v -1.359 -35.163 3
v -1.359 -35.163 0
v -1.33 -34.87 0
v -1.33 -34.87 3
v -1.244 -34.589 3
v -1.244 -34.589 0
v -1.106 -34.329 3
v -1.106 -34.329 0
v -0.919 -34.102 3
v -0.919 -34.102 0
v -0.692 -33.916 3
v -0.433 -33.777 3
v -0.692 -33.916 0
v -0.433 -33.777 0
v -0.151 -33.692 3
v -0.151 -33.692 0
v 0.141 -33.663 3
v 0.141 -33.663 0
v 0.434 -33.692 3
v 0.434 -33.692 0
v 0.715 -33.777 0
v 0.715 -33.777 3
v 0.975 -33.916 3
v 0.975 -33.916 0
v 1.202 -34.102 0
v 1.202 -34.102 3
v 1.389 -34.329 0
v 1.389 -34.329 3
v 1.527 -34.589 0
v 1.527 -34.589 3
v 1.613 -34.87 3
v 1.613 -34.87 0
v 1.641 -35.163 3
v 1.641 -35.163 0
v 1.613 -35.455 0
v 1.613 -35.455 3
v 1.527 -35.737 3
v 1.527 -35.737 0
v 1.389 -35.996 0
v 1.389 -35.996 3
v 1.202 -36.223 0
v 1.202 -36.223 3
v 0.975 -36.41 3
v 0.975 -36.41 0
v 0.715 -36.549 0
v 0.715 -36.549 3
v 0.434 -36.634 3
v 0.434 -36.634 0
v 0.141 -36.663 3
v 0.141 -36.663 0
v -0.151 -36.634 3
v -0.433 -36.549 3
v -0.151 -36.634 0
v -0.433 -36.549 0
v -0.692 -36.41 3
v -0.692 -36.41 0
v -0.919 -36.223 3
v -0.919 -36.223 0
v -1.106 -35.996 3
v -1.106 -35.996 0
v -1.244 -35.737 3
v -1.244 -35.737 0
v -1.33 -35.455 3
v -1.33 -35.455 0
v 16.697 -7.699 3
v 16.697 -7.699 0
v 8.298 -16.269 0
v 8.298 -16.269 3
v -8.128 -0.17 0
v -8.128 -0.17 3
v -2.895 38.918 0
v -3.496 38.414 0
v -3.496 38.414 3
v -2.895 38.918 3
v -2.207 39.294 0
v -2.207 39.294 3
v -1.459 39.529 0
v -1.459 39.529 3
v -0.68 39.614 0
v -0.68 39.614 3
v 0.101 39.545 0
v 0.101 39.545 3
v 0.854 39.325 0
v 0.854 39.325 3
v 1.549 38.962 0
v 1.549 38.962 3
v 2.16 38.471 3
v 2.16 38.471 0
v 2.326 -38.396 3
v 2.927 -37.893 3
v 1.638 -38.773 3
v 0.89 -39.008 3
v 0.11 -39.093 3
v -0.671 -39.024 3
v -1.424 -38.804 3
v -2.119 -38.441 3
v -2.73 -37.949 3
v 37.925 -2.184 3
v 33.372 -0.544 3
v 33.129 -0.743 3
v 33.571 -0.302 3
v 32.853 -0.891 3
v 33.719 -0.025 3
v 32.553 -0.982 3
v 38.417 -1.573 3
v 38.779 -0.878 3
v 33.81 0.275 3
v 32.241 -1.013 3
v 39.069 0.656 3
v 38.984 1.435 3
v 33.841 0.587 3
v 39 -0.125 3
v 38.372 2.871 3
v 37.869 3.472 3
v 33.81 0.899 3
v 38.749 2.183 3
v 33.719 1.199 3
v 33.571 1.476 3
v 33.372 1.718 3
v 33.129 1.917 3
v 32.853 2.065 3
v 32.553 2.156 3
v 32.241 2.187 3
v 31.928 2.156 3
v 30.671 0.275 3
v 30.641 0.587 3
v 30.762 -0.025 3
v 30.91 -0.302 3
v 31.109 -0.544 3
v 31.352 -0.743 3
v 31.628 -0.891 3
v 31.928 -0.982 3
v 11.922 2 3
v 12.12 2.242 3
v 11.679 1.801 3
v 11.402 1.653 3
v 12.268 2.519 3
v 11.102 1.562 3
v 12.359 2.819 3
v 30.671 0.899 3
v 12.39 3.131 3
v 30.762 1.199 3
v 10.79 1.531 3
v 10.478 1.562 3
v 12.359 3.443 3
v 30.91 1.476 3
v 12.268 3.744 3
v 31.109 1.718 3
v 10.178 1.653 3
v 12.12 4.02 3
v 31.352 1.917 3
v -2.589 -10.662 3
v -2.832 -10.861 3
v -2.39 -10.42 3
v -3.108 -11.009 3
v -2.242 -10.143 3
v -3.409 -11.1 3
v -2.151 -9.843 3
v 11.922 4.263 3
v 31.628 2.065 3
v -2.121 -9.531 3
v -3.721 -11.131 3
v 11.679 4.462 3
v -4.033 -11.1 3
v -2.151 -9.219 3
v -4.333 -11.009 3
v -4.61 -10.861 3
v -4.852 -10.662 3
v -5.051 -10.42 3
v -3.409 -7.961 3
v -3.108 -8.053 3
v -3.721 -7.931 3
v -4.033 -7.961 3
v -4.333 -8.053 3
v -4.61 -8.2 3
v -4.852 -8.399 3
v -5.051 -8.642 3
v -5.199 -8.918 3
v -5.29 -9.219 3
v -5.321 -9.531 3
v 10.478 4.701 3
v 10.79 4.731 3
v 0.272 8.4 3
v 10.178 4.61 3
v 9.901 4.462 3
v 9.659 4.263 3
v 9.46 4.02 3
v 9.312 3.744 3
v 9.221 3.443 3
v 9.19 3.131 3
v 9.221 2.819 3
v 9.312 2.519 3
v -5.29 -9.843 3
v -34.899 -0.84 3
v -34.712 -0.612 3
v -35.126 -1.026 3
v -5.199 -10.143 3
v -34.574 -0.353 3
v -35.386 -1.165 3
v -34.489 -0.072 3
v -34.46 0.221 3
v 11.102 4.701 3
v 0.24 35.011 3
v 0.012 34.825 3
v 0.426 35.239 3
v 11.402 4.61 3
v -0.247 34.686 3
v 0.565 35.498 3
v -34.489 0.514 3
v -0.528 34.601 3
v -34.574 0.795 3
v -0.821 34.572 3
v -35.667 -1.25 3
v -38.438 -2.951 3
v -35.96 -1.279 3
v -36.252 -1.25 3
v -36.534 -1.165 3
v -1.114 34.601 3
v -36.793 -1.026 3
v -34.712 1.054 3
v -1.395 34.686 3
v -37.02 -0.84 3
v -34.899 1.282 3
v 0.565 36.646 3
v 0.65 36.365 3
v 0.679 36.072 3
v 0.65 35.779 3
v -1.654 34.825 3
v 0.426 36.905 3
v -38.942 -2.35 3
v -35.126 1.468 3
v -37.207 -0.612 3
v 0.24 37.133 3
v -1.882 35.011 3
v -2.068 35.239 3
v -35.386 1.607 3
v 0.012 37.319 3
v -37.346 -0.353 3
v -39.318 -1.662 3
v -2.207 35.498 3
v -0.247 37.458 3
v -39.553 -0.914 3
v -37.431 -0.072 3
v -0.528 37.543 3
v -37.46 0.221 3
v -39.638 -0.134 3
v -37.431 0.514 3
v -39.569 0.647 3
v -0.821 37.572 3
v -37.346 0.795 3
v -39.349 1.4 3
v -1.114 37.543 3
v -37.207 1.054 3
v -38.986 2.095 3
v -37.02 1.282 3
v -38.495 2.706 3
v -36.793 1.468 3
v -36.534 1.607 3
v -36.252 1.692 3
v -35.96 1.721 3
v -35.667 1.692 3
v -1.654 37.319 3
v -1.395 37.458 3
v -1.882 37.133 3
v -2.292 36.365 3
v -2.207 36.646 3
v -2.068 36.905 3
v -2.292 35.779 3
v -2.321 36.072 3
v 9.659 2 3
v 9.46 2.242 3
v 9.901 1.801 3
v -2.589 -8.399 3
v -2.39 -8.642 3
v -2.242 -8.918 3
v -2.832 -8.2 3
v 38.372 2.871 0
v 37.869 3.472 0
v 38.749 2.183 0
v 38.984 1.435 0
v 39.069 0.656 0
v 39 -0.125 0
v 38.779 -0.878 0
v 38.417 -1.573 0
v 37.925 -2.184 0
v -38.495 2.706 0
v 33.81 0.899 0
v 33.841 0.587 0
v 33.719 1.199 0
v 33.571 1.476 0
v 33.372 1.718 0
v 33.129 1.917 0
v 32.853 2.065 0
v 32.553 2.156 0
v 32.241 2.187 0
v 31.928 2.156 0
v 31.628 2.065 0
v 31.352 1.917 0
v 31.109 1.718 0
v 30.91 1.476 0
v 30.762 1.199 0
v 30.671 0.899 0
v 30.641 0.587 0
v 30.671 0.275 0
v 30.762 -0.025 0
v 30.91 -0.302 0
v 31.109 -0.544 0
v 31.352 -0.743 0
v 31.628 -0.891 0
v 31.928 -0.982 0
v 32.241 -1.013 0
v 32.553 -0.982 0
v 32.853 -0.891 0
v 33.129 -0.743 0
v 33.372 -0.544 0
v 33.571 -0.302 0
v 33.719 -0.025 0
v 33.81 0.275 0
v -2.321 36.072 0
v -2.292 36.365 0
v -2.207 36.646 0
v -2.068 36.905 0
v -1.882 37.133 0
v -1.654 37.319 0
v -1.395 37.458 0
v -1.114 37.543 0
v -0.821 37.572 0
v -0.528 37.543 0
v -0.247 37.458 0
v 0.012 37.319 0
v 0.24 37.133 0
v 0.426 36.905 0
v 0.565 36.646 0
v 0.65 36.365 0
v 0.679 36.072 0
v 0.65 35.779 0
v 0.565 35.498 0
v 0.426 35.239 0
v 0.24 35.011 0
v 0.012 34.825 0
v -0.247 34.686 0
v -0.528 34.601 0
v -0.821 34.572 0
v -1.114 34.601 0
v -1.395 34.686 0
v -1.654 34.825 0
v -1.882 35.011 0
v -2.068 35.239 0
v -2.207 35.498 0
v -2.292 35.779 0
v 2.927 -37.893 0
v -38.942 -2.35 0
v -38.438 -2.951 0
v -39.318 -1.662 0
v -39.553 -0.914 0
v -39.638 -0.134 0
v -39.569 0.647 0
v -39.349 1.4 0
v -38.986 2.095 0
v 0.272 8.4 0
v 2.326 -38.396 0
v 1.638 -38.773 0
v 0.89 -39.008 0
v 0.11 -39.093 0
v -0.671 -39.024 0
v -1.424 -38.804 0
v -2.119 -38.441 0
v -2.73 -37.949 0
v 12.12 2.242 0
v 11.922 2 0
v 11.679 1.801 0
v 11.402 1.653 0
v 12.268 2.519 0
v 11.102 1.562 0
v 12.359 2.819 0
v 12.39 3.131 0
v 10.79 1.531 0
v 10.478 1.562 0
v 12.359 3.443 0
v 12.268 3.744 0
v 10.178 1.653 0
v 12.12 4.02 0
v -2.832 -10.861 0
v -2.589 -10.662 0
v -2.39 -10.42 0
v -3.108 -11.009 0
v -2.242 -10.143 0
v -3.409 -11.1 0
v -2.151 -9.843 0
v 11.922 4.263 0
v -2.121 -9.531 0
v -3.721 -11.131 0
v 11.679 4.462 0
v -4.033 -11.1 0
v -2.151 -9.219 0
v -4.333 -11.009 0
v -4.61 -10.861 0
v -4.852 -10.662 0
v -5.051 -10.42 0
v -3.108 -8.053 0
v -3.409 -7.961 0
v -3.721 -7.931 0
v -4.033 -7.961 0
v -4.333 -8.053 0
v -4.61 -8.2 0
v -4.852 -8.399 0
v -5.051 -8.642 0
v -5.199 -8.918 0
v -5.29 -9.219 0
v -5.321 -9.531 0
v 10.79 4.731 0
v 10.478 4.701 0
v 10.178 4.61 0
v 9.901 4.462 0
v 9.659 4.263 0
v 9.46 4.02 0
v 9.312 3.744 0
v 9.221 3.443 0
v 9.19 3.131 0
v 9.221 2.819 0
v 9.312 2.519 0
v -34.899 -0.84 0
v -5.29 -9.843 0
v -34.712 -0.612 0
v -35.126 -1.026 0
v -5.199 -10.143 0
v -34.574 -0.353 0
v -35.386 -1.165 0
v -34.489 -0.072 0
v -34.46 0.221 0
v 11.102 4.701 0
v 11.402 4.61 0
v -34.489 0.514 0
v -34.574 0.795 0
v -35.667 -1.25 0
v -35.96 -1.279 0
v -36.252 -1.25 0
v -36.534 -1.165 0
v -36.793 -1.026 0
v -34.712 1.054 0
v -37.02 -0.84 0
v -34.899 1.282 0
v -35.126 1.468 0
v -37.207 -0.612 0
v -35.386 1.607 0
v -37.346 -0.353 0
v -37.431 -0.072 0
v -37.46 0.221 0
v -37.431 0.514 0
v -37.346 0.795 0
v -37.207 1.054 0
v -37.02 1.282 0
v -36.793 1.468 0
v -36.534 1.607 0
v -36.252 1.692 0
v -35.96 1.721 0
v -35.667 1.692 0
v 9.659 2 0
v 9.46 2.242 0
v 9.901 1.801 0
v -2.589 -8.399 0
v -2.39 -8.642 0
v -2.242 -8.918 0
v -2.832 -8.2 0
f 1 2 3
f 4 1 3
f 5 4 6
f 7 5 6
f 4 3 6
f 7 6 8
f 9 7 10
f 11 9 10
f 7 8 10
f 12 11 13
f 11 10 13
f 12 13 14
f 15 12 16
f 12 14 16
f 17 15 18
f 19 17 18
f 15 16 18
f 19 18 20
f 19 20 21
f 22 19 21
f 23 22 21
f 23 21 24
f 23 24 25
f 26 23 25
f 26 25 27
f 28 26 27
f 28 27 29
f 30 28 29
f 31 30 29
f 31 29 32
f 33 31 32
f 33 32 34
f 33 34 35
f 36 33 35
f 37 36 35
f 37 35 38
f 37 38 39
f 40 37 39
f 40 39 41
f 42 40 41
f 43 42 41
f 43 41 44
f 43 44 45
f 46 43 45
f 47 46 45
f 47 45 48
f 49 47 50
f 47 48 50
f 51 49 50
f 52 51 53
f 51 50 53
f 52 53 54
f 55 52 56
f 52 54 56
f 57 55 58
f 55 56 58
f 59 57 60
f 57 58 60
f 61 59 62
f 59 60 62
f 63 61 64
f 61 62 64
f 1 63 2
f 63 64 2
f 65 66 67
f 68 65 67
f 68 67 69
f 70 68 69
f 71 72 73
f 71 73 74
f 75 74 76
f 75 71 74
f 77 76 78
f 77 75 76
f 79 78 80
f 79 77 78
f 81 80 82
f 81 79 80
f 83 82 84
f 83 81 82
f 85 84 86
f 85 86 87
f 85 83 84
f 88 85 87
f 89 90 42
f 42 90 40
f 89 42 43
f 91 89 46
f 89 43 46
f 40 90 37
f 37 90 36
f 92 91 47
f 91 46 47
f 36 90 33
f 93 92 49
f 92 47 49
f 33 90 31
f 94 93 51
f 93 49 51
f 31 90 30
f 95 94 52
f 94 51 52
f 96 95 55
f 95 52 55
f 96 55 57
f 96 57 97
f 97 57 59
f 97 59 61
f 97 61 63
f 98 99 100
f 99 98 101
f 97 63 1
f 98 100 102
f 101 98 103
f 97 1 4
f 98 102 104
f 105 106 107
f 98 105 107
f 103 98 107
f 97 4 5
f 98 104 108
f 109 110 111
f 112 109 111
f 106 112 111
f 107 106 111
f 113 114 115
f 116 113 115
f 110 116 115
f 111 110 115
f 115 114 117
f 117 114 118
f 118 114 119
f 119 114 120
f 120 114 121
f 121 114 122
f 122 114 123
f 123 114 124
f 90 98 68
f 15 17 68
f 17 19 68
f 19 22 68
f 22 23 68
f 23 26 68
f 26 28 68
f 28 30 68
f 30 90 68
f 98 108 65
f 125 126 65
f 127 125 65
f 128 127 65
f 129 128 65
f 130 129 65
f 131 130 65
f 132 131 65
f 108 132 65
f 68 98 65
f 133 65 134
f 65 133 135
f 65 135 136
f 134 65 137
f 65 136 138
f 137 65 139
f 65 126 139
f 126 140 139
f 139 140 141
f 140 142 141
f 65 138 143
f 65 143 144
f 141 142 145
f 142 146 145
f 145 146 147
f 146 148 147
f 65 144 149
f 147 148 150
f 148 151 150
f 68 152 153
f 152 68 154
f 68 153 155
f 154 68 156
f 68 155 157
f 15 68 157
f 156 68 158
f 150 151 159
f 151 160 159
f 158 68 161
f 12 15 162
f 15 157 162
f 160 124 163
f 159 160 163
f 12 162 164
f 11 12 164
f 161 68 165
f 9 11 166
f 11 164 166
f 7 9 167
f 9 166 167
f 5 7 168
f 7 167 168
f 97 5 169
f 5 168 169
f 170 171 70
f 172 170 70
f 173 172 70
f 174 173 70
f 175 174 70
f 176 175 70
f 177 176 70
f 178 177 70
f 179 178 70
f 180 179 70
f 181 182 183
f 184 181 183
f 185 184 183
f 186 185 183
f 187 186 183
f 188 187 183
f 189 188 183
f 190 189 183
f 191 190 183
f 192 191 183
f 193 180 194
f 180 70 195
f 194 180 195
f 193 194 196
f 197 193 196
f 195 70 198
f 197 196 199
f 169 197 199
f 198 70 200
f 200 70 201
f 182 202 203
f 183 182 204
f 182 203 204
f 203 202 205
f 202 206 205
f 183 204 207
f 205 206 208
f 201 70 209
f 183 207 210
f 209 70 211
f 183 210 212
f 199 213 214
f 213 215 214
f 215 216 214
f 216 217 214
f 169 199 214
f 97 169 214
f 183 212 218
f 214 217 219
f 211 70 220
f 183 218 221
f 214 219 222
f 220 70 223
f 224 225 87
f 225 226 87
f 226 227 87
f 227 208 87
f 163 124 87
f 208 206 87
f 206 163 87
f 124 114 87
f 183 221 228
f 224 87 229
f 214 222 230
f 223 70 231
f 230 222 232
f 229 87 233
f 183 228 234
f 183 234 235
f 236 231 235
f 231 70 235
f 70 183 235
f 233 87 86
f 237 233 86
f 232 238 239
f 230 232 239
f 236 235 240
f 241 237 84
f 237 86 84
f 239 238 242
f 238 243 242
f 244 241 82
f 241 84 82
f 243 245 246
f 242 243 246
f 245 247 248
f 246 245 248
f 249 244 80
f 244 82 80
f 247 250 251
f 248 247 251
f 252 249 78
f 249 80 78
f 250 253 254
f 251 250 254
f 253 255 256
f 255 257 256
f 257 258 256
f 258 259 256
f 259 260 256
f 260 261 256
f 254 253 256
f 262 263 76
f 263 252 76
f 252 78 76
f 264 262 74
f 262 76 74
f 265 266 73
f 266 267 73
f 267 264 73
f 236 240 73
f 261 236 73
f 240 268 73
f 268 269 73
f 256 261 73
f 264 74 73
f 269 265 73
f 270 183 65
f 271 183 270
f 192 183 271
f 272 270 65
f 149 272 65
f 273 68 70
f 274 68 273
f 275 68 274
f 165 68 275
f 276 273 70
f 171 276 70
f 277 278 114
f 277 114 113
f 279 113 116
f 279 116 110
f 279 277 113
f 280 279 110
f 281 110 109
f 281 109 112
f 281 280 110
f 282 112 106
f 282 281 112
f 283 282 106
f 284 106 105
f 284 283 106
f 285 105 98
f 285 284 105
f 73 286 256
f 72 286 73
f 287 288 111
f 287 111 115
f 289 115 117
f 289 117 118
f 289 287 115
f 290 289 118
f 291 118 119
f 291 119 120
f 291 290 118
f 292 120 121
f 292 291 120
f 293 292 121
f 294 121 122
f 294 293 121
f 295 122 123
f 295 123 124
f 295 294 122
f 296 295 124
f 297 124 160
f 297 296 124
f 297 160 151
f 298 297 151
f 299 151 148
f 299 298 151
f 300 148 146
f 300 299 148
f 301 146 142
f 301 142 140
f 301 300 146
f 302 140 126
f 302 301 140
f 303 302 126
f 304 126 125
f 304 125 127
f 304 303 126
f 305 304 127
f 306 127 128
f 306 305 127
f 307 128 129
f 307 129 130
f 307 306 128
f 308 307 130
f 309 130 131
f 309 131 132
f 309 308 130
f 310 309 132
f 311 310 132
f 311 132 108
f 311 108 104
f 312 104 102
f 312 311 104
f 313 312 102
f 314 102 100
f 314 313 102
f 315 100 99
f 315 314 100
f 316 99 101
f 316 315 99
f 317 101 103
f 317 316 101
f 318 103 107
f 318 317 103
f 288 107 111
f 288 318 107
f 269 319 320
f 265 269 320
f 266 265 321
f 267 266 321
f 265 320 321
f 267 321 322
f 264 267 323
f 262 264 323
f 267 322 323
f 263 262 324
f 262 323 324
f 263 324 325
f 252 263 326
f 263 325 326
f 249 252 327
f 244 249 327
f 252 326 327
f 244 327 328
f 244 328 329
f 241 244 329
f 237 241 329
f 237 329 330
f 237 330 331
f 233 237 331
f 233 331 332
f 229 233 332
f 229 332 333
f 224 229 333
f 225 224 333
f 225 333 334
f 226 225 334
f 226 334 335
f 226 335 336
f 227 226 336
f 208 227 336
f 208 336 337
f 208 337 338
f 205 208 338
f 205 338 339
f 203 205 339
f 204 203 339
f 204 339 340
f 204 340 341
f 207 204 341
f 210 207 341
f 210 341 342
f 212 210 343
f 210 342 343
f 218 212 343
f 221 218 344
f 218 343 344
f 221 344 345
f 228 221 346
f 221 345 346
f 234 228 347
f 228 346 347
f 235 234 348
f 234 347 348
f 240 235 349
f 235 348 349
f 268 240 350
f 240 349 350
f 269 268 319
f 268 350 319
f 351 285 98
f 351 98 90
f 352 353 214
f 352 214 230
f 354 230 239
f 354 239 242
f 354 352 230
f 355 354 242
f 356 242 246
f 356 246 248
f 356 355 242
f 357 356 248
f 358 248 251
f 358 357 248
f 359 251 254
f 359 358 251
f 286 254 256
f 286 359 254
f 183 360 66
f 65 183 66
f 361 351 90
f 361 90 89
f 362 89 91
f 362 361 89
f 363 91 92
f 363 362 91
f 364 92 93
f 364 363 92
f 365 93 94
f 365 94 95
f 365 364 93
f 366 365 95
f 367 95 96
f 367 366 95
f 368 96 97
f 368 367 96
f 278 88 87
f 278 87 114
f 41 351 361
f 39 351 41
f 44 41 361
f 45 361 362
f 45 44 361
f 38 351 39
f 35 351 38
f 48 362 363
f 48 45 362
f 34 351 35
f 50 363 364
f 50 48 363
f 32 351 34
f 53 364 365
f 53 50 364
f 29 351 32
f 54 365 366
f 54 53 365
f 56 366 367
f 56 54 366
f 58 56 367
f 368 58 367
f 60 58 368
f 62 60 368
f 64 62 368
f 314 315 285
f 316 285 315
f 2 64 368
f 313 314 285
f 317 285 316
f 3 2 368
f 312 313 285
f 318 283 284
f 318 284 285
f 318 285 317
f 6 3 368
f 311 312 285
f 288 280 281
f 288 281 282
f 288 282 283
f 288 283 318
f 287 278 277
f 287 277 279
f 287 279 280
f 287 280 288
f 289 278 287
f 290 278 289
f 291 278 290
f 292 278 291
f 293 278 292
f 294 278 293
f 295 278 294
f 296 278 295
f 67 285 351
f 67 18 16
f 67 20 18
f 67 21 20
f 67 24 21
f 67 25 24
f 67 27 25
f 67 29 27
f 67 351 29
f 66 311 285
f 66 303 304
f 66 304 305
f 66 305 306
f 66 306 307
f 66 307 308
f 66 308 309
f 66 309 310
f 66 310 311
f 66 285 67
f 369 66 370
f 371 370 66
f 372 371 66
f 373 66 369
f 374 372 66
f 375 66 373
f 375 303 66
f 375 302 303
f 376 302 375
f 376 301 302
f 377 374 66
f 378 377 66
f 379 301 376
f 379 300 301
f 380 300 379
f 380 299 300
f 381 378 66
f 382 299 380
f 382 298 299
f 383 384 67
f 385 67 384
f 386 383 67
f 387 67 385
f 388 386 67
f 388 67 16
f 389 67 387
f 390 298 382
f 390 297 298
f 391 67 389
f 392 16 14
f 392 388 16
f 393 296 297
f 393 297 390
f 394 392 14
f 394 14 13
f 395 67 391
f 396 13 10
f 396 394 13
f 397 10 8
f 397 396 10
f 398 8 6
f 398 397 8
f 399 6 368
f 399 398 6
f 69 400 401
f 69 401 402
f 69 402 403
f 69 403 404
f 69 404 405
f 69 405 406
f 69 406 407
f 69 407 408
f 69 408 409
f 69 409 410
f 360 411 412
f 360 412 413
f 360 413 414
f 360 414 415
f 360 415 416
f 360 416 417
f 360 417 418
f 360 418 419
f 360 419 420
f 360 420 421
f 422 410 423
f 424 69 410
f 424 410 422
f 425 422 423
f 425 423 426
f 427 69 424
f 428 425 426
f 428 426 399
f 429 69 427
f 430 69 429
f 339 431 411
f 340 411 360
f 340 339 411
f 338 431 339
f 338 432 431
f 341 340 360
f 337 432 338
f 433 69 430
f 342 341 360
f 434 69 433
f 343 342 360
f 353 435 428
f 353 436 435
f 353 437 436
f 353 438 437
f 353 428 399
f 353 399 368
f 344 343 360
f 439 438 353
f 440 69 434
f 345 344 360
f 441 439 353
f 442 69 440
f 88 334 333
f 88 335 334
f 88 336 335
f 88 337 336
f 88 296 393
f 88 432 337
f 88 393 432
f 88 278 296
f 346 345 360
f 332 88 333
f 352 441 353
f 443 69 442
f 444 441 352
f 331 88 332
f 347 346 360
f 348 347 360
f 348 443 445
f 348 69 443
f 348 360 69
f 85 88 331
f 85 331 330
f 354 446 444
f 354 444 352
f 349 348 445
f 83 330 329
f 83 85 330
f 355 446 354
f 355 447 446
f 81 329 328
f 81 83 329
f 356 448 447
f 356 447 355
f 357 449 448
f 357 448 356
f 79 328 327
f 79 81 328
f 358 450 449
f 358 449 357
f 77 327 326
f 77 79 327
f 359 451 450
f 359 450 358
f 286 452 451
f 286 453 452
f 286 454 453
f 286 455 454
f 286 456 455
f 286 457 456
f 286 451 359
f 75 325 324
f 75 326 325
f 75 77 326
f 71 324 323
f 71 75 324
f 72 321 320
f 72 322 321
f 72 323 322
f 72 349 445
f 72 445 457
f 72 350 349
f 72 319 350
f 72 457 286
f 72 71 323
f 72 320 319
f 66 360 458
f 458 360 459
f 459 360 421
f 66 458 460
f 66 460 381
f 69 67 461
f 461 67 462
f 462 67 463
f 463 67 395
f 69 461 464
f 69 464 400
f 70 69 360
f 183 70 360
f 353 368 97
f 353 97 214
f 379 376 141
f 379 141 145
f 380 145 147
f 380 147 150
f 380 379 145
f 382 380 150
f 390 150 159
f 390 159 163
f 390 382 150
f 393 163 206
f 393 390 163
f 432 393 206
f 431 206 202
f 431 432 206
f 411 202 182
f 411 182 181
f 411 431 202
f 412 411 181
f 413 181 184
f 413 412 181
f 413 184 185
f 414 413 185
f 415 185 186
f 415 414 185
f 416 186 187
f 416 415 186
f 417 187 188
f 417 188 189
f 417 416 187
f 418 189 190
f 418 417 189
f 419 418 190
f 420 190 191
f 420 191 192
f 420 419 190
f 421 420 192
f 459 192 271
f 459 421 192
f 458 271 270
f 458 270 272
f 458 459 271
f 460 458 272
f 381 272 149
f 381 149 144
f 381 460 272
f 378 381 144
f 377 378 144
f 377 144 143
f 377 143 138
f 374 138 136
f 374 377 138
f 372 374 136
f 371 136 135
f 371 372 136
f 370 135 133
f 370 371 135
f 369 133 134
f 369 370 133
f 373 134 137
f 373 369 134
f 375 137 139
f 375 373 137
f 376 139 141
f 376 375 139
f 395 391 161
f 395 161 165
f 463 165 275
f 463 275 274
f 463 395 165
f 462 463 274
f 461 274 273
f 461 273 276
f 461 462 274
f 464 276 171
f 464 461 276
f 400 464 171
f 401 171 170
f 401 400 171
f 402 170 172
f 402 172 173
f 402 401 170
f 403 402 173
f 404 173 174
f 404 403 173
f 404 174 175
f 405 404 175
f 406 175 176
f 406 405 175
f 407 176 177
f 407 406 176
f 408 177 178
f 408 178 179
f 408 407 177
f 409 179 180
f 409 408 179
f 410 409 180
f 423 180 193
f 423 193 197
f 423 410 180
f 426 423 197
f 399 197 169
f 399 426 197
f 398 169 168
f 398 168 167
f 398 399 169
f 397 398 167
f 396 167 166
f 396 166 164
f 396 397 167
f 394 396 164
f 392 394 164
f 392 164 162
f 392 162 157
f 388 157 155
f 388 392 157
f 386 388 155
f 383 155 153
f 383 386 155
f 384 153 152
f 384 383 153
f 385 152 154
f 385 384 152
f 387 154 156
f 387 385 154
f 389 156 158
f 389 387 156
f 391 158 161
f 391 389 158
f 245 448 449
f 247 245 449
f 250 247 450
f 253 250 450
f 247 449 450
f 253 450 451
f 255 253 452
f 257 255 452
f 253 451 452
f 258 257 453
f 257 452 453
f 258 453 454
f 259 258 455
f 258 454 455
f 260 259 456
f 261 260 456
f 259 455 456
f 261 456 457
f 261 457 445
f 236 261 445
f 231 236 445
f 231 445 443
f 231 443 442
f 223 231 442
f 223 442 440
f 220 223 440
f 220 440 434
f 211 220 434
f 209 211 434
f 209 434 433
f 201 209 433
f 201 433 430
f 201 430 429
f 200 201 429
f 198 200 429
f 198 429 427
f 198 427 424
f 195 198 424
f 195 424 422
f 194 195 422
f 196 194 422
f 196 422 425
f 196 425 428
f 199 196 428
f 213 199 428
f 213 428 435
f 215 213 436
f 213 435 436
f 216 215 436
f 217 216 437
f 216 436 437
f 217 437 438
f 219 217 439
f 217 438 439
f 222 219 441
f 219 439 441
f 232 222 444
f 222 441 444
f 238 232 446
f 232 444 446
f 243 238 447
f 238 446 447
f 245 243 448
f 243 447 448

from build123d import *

# Parameters (mm, degrees)
ESQUISSE1_R             = 1.6
BOSS_EXTRU_1_DEPTH      = 3
ESQUISSE2_R             = 1.5
ENL_V_MAT_EXTRU_1_DEPTH = 10


with BuildPart() as part:
    # Esquisse1 → Boss.-Extru.1 (new body)
    with BuildSketch(Plane.XY):
        with BuildLine():
            Line((2.16040571, 38.470971764), (37.868700226, 3.47214746))
            ThreePointArc((37.868700226, 3.47214746), (39.068592938, 0.655617594), (37.925457843, -2.184422046))
            Line((37.925457843, -2.184422046), (2.926633539, -37.892716563))
            ThreePointArc((2.926633539, -37.892716563), (0.110103674, -39.092609274), (-2.729935967, -37.94947418))
            Line((-2.729935967, -37.94947418), (-38.438230483, -2.950649875))
            ThreePointArc((-38.438230483, -2.950649875), (-39.638123195, -0.13412001), (-38.4949881, 2.705919631))
            Line((-38.4949881, 2.705919631), (-3.496163796, 38.414214147))
            ThreePointArc((-3.496163796, 38.414214147), (-0.67963393, 39.614106858), (2.16040571, 38.470971764))
        make_face()
        with Locations((10.790147704, 3.13130948)):
            Circle(ESQUISSE1_R, mode=Mode.SUBTRACT)
        with Locations((-3.720649665, -9.530710886)):
            Circle(ESQUISSE1_R, mode=Mode.SUBTRACT)
        with Locations((32.240509529, 0.58710509)):
            Circle(ESQUISSE1_R, mode=Mode.SUBTRACT)
        Polygon((16.69738986, -7.699410262), (8.297672026, -16.269400946), (-8.128143451, -0.169941765), (0.271574382, 8.400048919), align=None, mode=Mode.SUBTRACT)
    extrude(amount=BOSS_EXTRU_1_DEPTH)

    # Esquisse2 → Enlèv. mat.-Extru.1 (cut)
    with BuildSketch(Plane(origin=(0, 0, 0), x_dir=(-1, 0, 0), z_dir=(0, 0, -1))):
        with Locations((0.820879588, 36.0721308)):
            Circle(ESQUISSE2_R)
        with Locations((35.95969919, 0.221003105)):
            Circle(ESQUISSE2_R)
        with Locations((-0.141386567, -35.162808267)):
            Circle(ESQUISSE2_R)
    extrude(amount=-ENL_V_MAT_EXTRU_1_DEPTH, mode=Mode.SUBTRACT)


solid = part.part
